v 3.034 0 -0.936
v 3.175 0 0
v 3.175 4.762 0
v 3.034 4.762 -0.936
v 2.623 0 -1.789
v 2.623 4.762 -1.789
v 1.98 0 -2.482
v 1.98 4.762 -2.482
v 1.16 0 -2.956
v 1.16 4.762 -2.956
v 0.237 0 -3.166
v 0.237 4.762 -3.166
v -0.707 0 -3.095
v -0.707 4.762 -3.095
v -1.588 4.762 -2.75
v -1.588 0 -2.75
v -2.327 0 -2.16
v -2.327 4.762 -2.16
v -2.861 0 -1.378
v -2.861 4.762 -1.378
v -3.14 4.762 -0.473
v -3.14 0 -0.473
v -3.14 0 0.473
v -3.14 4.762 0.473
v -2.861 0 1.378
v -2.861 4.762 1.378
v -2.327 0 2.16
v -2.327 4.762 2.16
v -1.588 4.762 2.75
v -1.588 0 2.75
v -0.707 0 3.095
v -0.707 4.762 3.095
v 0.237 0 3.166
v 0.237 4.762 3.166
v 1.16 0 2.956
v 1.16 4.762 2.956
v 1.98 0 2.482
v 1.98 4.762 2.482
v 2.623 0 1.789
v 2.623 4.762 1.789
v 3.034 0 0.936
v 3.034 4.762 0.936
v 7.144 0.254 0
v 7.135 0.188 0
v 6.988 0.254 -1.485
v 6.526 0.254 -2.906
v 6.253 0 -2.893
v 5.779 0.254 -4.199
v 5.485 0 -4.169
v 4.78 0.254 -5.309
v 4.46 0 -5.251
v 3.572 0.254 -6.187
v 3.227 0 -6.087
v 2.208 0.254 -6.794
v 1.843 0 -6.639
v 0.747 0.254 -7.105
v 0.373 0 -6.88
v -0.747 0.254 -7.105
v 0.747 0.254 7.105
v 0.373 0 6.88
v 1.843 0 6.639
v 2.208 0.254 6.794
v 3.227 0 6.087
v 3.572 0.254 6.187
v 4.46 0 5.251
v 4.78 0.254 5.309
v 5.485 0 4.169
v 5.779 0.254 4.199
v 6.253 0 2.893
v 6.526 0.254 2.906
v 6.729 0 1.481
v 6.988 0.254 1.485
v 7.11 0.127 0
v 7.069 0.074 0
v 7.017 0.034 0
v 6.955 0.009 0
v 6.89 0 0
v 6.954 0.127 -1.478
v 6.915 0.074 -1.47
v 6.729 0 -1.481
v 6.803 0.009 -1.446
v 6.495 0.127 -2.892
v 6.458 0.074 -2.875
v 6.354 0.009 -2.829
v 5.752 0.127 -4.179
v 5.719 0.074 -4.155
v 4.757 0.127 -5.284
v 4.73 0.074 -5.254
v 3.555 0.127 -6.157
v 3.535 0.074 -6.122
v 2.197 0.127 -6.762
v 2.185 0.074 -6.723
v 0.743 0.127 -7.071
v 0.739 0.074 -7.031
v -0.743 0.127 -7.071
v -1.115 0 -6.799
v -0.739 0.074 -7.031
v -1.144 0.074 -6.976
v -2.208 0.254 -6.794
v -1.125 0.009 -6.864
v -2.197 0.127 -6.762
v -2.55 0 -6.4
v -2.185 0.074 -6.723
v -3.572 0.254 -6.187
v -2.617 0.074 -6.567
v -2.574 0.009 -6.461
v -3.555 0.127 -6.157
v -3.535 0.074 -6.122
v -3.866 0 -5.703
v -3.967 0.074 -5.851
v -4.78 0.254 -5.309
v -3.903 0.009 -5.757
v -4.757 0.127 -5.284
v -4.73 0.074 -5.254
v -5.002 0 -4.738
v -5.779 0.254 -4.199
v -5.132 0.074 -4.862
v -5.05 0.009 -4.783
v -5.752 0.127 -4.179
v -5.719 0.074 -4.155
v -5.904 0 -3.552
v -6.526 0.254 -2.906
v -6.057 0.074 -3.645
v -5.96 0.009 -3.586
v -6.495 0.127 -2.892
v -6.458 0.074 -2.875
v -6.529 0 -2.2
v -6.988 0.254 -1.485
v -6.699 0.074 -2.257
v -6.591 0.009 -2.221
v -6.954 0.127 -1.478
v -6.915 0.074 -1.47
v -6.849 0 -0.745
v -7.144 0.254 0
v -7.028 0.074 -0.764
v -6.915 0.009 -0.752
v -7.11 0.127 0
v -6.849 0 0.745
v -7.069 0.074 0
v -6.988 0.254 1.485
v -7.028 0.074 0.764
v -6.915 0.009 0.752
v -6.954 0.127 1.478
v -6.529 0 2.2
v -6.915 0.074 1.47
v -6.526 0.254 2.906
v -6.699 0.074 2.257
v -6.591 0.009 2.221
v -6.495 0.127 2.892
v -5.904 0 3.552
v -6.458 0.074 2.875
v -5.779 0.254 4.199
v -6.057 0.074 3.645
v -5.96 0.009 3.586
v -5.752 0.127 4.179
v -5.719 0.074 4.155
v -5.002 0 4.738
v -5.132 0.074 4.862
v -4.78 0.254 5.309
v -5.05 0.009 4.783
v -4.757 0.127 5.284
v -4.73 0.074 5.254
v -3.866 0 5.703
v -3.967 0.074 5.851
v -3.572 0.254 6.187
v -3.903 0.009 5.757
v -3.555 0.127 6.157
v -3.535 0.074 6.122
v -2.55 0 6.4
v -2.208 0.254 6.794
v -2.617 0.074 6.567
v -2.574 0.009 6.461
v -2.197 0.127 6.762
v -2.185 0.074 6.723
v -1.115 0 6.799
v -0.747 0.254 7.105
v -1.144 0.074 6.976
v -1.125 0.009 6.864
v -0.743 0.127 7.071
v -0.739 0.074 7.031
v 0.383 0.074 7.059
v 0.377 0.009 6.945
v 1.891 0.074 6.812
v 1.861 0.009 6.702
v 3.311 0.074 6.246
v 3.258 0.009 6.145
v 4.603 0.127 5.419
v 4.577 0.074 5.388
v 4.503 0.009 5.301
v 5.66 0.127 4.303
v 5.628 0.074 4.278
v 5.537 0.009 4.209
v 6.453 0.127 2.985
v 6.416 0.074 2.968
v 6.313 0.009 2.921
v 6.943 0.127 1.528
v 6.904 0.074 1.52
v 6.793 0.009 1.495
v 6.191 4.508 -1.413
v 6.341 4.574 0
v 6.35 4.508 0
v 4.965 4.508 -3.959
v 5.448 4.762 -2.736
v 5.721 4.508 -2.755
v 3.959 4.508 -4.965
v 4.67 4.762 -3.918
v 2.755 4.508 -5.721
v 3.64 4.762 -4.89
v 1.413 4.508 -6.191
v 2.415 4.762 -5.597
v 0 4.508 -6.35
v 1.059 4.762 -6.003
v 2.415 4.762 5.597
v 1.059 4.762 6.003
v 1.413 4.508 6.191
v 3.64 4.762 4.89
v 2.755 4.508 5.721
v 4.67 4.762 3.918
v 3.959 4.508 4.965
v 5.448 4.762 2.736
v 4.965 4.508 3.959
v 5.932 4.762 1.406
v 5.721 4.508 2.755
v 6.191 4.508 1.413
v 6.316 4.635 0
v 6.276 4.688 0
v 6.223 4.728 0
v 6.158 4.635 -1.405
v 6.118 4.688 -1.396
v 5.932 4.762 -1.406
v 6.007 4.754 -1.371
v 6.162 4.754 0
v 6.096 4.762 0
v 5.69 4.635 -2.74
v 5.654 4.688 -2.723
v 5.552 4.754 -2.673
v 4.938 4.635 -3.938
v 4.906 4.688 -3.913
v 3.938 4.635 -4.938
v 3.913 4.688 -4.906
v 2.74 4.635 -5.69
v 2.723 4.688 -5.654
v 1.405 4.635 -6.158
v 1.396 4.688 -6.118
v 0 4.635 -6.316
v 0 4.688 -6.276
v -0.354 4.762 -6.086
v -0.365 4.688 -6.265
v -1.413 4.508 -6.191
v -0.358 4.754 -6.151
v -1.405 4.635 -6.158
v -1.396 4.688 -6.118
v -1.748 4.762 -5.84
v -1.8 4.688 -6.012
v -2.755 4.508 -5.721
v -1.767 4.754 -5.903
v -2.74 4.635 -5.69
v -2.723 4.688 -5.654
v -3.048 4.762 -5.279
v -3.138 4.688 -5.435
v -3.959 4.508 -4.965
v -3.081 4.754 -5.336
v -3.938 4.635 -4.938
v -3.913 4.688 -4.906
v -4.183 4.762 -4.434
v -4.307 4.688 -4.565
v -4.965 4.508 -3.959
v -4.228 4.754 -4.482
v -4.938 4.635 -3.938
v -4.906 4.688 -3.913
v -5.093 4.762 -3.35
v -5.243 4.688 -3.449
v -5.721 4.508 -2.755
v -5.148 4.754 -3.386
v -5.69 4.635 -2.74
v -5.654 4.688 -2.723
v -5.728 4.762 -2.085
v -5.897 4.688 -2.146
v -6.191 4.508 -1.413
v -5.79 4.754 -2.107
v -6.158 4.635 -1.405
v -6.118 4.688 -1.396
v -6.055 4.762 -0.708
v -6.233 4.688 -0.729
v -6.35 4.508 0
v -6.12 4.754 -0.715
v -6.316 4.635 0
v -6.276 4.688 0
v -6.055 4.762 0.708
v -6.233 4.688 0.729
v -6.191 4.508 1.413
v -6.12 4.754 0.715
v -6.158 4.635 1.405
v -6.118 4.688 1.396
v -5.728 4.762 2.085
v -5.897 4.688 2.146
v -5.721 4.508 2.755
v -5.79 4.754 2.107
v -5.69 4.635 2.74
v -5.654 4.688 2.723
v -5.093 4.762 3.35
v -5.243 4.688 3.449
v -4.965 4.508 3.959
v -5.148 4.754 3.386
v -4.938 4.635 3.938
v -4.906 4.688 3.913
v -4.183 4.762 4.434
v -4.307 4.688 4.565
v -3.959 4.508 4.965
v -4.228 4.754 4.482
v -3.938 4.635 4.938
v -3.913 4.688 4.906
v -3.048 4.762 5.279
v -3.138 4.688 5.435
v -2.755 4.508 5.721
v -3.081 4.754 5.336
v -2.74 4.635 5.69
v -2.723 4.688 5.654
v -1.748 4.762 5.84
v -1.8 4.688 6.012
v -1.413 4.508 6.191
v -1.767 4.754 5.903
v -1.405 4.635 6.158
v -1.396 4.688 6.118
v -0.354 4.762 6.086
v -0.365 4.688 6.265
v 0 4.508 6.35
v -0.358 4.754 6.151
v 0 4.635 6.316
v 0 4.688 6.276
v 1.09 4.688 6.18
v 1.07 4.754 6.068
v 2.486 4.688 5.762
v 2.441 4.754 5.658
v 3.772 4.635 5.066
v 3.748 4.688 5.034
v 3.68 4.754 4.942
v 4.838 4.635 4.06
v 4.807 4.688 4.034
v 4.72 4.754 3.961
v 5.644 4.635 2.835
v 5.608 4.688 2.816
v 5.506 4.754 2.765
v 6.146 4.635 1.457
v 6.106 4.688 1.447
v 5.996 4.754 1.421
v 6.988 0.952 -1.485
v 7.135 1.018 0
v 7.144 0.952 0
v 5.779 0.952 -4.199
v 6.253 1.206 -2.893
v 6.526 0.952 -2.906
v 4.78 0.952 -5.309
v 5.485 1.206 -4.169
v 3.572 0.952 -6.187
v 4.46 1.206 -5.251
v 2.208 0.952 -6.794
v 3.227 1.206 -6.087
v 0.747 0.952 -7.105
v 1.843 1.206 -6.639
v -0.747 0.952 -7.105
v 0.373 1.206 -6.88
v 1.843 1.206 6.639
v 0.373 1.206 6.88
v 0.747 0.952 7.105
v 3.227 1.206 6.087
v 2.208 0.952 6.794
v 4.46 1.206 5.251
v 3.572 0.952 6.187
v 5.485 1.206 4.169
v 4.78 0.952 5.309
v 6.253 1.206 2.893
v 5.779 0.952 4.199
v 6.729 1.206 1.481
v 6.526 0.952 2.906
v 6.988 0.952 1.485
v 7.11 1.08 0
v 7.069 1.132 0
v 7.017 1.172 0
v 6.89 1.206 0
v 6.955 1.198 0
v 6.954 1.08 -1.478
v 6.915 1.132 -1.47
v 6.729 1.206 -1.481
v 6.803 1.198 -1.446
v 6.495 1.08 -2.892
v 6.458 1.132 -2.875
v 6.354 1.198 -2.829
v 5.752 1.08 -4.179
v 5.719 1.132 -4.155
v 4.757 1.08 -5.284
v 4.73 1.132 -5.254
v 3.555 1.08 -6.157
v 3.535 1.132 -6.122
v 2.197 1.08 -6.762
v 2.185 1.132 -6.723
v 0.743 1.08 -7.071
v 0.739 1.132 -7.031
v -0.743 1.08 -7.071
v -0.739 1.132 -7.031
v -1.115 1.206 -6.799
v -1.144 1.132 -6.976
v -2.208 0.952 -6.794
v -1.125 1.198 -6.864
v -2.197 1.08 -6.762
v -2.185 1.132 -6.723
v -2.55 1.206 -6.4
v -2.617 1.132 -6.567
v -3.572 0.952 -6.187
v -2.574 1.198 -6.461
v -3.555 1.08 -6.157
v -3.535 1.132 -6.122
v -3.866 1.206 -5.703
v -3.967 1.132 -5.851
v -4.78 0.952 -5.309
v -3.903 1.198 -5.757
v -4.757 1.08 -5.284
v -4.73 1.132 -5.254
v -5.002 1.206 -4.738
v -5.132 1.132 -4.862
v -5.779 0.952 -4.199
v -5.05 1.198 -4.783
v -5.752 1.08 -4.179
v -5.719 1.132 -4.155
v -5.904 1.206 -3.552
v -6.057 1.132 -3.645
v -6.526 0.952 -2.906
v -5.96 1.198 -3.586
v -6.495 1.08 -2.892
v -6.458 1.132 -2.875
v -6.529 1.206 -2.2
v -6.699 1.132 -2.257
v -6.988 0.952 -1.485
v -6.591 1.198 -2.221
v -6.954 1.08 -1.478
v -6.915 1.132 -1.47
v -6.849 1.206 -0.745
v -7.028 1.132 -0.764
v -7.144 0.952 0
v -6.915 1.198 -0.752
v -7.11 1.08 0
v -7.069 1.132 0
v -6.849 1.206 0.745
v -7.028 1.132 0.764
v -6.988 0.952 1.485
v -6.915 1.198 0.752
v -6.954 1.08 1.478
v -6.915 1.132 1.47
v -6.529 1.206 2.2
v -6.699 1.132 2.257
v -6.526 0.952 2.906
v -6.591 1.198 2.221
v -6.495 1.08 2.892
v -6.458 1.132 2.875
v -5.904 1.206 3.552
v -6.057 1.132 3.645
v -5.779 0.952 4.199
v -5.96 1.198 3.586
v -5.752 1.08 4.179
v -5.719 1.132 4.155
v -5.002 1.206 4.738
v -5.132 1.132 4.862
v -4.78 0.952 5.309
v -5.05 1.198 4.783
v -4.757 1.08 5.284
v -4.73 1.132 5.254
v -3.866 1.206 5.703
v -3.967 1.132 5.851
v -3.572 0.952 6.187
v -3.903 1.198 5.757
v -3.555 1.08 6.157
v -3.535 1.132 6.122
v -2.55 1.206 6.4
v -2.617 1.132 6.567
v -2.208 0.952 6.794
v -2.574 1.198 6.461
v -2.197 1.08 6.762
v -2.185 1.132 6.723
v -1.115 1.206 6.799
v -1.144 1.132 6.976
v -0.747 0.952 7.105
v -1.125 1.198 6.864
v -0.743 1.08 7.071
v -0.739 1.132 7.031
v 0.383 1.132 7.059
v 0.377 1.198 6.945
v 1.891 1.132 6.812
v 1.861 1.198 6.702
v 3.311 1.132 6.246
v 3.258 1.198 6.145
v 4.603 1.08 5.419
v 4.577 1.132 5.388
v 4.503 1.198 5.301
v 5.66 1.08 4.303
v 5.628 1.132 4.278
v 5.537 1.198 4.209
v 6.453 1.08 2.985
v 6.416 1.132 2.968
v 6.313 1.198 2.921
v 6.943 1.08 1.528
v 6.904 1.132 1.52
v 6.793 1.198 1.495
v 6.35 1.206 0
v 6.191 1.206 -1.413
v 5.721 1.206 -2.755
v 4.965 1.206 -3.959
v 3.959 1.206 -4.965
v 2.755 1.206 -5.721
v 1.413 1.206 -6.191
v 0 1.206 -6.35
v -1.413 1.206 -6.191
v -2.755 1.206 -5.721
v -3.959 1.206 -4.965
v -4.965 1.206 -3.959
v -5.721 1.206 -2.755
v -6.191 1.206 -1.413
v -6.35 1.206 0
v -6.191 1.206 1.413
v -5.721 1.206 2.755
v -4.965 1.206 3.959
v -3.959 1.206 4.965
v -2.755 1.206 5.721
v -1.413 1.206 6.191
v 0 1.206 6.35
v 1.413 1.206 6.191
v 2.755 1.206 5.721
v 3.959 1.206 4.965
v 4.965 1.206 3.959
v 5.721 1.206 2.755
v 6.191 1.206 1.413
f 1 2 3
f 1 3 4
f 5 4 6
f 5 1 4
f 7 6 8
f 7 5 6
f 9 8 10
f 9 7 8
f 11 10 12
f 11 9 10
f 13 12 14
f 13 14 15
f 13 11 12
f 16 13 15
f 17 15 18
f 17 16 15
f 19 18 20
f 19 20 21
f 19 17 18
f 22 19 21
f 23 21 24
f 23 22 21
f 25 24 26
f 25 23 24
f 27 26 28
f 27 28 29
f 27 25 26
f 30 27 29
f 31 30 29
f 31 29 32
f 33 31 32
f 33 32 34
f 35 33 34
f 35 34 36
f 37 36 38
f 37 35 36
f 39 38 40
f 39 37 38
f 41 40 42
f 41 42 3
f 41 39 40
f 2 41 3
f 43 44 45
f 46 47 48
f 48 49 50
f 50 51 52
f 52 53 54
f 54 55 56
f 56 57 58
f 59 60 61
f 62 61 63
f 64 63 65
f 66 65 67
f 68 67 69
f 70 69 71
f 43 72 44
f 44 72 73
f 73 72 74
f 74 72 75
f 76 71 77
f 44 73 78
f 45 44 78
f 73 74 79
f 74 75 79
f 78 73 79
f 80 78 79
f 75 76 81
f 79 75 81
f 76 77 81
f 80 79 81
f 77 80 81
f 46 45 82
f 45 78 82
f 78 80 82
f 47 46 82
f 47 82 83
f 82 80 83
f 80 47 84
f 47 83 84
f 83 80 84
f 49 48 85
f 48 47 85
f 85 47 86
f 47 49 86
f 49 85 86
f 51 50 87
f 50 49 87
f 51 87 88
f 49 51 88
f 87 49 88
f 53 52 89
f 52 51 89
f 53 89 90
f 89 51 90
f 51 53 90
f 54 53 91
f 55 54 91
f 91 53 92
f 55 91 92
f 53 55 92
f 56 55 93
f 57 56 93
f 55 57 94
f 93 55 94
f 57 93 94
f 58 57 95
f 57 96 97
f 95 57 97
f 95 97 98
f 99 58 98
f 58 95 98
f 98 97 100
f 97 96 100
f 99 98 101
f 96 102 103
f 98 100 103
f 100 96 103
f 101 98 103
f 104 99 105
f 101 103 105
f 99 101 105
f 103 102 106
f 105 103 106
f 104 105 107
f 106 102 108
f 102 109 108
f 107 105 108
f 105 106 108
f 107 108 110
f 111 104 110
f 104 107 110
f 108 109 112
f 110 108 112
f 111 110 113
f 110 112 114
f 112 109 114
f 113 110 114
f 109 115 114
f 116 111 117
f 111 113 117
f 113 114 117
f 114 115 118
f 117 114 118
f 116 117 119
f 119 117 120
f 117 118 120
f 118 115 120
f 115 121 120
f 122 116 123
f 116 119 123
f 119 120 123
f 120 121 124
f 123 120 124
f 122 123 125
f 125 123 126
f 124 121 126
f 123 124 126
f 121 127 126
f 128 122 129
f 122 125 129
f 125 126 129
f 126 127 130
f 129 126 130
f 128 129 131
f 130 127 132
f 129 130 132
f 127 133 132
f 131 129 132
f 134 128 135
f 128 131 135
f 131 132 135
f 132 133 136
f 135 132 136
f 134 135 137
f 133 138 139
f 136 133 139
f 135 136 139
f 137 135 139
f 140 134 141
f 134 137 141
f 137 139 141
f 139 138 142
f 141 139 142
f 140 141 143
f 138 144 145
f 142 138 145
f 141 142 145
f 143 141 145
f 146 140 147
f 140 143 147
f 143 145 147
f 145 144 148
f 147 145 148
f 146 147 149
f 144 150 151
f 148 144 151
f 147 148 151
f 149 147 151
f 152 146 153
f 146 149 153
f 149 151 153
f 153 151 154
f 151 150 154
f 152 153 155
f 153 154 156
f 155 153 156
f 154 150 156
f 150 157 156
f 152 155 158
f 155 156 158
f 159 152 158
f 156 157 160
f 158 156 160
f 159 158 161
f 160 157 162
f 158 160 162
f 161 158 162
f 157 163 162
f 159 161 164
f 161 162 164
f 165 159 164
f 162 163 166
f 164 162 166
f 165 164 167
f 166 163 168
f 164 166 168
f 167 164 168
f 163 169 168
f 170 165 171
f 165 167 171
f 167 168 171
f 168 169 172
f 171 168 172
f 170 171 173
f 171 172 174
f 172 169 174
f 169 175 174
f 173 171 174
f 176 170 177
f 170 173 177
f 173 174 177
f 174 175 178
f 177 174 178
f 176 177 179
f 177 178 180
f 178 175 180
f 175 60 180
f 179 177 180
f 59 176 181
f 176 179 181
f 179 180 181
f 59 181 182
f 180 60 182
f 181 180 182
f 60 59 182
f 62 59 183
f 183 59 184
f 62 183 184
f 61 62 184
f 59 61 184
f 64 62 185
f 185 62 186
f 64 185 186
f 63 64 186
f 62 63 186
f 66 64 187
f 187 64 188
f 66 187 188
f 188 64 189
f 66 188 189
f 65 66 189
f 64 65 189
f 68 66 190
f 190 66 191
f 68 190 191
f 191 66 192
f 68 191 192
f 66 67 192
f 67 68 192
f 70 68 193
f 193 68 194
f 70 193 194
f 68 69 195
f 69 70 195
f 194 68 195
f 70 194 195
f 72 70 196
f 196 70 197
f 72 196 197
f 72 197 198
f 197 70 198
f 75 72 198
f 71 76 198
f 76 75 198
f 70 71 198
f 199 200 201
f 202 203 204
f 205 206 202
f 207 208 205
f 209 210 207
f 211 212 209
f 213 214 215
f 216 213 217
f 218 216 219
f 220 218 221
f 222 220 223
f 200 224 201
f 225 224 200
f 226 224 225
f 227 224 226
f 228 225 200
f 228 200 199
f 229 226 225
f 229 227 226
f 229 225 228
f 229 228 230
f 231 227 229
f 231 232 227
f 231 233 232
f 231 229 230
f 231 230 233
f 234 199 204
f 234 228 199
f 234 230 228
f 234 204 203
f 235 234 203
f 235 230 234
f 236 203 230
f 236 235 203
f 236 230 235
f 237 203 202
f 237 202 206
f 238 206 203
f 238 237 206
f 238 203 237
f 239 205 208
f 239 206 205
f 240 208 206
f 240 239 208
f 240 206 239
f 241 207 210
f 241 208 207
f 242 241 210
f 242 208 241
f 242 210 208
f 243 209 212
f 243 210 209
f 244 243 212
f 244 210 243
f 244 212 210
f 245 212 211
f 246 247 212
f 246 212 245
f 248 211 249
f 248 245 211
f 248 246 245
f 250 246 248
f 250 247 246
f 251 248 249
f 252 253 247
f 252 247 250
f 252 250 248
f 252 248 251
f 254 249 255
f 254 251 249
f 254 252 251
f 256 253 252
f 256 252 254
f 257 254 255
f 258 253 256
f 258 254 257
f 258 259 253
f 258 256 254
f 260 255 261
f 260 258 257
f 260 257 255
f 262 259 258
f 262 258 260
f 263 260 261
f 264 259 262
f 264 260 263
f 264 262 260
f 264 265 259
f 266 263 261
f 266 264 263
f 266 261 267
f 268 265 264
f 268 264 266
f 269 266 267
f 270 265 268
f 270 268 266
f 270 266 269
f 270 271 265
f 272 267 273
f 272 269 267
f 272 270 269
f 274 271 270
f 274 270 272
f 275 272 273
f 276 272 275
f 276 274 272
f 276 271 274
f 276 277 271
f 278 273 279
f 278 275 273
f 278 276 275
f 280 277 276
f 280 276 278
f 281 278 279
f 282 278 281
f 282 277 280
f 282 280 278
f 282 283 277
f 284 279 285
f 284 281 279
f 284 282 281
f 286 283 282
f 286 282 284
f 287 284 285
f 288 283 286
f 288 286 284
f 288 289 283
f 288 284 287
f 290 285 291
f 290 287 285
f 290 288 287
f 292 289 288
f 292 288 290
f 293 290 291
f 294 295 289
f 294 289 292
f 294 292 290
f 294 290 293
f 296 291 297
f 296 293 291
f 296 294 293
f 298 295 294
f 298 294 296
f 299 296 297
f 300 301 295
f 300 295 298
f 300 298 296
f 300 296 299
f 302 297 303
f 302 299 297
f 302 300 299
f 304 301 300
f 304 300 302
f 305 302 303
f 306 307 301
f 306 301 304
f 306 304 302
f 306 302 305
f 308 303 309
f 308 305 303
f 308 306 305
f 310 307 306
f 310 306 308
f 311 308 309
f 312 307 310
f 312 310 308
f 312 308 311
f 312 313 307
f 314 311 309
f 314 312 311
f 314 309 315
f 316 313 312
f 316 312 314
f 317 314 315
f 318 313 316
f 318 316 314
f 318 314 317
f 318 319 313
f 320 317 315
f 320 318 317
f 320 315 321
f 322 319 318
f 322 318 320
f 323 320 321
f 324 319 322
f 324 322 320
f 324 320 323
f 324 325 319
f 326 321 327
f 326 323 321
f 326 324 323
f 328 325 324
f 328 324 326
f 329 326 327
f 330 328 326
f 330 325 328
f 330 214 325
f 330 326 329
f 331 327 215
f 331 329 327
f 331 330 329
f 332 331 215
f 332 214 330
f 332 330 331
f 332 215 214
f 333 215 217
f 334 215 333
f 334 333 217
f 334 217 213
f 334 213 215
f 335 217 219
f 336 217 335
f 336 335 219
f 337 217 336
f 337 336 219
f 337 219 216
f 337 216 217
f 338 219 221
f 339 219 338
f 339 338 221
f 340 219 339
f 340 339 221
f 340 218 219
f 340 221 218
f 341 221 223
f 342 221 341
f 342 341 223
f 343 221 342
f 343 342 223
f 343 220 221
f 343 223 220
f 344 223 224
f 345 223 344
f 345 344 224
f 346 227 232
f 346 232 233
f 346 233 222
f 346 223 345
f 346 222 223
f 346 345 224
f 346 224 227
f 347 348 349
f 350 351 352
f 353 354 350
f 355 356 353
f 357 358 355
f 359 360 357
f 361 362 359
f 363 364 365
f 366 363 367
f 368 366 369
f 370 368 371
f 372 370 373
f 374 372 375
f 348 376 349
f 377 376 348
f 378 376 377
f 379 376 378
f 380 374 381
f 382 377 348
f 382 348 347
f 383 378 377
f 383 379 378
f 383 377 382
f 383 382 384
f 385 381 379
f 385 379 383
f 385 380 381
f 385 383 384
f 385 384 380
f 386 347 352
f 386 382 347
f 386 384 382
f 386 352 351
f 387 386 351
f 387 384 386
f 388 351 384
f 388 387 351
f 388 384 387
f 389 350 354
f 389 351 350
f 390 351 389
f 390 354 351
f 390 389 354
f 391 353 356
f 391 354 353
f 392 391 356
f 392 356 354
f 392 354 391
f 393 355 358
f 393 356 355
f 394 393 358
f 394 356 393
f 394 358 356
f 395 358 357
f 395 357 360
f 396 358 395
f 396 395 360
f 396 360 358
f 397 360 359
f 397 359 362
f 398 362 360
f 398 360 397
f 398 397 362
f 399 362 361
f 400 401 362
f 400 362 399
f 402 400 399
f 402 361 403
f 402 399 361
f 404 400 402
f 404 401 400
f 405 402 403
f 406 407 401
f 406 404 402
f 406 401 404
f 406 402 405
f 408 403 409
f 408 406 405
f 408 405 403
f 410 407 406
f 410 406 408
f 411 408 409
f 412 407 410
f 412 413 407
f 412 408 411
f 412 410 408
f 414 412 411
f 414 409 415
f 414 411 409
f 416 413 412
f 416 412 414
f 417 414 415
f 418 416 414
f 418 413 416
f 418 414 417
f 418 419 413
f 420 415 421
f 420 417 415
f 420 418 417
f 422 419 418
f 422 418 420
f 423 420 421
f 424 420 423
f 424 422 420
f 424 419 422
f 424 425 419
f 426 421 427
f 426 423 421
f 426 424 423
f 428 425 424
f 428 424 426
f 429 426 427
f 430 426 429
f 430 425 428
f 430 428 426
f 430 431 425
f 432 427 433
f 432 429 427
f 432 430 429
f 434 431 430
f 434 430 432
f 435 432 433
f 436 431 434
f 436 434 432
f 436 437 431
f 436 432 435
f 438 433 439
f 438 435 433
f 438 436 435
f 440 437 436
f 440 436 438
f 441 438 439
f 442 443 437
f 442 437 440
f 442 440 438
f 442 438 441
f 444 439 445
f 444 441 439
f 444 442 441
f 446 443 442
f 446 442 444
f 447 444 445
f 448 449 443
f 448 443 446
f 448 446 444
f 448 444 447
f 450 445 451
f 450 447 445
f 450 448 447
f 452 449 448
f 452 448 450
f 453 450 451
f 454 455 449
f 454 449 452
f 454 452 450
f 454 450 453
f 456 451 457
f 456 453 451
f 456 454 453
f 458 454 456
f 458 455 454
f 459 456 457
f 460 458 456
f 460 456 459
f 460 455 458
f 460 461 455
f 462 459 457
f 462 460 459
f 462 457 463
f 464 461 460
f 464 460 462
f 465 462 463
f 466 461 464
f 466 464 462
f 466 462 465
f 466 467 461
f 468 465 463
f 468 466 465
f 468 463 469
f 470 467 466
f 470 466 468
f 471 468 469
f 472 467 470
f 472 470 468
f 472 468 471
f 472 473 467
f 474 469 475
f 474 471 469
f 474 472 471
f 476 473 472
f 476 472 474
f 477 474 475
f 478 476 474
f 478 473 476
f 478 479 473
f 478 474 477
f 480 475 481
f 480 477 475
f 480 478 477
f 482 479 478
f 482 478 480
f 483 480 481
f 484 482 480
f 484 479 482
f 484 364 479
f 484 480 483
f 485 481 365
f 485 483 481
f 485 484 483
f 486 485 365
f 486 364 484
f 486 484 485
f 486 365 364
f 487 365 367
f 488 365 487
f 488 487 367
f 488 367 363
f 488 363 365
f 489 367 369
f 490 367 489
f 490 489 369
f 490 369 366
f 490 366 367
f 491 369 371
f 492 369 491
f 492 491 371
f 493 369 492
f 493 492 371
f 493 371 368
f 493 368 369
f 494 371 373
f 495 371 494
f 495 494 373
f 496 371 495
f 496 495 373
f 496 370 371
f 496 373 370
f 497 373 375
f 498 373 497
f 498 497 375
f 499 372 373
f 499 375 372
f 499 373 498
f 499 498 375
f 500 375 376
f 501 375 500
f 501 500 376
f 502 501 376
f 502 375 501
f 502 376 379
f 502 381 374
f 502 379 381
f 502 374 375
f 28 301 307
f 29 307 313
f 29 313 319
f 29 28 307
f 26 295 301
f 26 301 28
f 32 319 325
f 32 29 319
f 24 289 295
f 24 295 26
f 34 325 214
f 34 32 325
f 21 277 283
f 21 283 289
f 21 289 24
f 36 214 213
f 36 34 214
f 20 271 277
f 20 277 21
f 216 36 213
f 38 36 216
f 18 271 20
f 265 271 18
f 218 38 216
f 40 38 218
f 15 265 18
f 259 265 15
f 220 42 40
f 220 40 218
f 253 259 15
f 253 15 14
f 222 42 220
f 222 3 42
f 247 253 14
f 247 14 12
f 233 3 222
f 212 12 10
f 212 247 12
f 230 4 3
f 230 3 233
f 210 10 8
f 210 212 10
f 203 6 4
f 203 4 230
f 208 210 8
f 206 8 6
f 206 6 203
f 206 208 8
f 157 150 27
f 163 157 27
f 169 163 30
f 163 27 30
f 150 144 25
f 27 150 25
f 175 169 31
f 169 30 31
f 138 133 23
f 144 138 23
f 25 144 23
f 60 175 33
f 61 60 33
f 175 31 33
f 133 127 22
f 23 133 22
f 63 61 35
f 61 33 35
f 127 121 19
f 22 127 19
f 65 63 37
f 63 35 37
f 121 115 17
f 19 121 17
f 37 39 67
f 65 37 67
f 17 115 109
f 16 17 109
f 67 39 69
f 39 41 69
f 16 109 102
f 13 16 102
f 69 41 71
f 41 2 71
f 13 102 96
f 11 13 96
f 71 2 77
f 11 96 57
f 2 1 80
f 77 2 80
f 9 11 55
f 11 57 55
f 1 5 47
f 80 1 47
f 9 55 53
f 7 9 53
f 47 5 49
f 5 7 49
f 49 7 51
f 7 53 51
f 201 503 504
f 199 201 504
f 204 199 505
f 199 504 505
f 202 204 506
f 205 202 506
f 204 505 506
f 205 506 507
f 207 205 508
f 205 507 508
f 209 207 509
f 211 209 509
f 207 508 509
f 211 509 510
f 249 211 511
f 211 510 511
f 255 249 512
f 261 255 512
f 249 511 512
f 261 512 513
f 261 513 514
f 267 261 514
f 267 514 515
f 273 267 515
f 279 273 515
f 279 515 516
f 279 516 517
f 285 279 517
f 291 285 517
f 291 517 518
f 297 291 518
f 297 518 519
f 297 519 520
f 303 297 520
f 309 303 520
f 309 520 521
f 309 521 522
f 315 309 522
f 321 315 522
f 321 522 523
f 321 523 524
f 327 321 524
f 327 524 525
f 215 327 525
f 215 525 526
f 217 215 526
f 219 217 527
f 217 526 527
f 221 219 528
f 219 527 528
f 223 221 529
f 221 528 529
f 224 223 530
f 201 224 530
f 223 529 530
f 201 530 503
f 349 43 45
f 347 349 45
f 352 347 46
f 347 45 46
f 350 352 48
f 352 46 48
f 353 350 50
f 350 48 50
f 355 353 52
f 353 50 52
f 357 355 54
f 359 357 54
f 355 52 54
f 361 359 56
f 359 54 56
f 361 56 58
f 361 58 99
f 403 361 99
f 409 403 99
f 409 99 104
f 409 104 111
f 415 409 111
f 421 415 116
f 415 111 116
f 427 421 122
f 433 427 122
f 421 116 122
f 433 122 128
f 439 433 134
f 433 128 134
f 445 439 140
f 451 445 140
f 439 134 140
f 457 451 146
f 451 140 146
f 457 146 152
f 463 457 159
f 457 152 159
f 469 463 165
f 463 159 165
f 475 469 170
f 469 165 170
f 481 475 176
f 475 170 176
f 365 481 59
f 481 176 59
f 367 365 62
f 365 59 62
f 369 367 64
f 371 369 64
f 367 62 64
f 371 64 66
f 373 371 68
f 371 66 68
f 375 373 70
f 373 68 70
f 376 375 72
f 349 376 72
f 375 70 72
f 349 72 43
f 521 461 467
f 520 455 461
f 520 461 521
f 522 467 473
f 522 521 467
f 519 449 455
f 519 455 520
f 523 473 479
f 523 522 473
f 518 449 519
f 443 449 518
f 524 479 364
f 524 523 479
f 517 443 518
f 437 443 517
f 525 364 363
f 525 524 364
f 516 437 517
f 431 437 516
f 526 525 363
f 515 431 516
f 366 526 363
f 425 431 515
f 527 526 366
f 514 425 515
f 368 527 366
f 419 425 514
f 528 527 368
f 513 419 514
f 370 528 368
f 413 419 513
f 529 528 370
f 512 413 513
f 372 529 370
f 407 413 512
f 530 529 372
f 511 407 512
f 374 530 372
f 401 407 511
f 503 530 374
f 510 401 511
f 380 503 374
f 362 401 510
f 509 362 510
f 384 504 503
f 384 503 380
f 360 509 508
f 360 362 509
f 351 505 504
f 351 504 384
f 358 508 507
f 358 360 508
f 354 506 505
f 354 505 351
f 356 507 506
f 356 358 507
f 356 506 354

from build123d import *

# Parameters (mm, degrees)
SKETCH1_R           = 6.35
SKETCH1_R_2         = 3.175
BOSS_EXTRUDE1_DEPTH = 4.7625
SKETCH1_3_R         = 7.14375
SKETCH1_3_R_2       = 6.35
BOSS_EXTRUDE2_DEPTH = 1.2065
FILLET1_R           = 0.254


with BuildPart() as part:
    # Sketch1 → Boss-Extrude1 (new body)
    with BuildSketch(Plane(origin=(0, 0, 0), x_dir=(1, 0, 0), z_dir=(0, 1, 0))):
        Circle(SKETCH1_R)
        Circle(SKETCH1_R_2, mode=Mode.SUBTRACT)
    extrude(amount=BOSS_EXTRUDE1_DEPTH)

    # Sketch1<3> → Boss-Extrude2 (add)
    with BuildSketch(Plane(origin=(0, 0, 0), x_dir=(1, 0, 0), z_dir=(0, 1, 0))):
        Circle(SKETCH1_3_R)
        Circle(SKETCH1_3_R_2, mode=Mode.SUBTRACT)
    extrude(amount=BOSS_EXTRUDE2_DEPTH)

    # Fillet1
    fillet1_edges = [part.edges().sort_by_distance(p)[0] for p in [
        (-7.14375, 1.2065, 0),
        (-6.35, 4.7625, 0),
        (-7.14375, 0, 0),
    ]]
    fillet(fillet1_edges, radius=FILLET1_R)


solid = part.part
